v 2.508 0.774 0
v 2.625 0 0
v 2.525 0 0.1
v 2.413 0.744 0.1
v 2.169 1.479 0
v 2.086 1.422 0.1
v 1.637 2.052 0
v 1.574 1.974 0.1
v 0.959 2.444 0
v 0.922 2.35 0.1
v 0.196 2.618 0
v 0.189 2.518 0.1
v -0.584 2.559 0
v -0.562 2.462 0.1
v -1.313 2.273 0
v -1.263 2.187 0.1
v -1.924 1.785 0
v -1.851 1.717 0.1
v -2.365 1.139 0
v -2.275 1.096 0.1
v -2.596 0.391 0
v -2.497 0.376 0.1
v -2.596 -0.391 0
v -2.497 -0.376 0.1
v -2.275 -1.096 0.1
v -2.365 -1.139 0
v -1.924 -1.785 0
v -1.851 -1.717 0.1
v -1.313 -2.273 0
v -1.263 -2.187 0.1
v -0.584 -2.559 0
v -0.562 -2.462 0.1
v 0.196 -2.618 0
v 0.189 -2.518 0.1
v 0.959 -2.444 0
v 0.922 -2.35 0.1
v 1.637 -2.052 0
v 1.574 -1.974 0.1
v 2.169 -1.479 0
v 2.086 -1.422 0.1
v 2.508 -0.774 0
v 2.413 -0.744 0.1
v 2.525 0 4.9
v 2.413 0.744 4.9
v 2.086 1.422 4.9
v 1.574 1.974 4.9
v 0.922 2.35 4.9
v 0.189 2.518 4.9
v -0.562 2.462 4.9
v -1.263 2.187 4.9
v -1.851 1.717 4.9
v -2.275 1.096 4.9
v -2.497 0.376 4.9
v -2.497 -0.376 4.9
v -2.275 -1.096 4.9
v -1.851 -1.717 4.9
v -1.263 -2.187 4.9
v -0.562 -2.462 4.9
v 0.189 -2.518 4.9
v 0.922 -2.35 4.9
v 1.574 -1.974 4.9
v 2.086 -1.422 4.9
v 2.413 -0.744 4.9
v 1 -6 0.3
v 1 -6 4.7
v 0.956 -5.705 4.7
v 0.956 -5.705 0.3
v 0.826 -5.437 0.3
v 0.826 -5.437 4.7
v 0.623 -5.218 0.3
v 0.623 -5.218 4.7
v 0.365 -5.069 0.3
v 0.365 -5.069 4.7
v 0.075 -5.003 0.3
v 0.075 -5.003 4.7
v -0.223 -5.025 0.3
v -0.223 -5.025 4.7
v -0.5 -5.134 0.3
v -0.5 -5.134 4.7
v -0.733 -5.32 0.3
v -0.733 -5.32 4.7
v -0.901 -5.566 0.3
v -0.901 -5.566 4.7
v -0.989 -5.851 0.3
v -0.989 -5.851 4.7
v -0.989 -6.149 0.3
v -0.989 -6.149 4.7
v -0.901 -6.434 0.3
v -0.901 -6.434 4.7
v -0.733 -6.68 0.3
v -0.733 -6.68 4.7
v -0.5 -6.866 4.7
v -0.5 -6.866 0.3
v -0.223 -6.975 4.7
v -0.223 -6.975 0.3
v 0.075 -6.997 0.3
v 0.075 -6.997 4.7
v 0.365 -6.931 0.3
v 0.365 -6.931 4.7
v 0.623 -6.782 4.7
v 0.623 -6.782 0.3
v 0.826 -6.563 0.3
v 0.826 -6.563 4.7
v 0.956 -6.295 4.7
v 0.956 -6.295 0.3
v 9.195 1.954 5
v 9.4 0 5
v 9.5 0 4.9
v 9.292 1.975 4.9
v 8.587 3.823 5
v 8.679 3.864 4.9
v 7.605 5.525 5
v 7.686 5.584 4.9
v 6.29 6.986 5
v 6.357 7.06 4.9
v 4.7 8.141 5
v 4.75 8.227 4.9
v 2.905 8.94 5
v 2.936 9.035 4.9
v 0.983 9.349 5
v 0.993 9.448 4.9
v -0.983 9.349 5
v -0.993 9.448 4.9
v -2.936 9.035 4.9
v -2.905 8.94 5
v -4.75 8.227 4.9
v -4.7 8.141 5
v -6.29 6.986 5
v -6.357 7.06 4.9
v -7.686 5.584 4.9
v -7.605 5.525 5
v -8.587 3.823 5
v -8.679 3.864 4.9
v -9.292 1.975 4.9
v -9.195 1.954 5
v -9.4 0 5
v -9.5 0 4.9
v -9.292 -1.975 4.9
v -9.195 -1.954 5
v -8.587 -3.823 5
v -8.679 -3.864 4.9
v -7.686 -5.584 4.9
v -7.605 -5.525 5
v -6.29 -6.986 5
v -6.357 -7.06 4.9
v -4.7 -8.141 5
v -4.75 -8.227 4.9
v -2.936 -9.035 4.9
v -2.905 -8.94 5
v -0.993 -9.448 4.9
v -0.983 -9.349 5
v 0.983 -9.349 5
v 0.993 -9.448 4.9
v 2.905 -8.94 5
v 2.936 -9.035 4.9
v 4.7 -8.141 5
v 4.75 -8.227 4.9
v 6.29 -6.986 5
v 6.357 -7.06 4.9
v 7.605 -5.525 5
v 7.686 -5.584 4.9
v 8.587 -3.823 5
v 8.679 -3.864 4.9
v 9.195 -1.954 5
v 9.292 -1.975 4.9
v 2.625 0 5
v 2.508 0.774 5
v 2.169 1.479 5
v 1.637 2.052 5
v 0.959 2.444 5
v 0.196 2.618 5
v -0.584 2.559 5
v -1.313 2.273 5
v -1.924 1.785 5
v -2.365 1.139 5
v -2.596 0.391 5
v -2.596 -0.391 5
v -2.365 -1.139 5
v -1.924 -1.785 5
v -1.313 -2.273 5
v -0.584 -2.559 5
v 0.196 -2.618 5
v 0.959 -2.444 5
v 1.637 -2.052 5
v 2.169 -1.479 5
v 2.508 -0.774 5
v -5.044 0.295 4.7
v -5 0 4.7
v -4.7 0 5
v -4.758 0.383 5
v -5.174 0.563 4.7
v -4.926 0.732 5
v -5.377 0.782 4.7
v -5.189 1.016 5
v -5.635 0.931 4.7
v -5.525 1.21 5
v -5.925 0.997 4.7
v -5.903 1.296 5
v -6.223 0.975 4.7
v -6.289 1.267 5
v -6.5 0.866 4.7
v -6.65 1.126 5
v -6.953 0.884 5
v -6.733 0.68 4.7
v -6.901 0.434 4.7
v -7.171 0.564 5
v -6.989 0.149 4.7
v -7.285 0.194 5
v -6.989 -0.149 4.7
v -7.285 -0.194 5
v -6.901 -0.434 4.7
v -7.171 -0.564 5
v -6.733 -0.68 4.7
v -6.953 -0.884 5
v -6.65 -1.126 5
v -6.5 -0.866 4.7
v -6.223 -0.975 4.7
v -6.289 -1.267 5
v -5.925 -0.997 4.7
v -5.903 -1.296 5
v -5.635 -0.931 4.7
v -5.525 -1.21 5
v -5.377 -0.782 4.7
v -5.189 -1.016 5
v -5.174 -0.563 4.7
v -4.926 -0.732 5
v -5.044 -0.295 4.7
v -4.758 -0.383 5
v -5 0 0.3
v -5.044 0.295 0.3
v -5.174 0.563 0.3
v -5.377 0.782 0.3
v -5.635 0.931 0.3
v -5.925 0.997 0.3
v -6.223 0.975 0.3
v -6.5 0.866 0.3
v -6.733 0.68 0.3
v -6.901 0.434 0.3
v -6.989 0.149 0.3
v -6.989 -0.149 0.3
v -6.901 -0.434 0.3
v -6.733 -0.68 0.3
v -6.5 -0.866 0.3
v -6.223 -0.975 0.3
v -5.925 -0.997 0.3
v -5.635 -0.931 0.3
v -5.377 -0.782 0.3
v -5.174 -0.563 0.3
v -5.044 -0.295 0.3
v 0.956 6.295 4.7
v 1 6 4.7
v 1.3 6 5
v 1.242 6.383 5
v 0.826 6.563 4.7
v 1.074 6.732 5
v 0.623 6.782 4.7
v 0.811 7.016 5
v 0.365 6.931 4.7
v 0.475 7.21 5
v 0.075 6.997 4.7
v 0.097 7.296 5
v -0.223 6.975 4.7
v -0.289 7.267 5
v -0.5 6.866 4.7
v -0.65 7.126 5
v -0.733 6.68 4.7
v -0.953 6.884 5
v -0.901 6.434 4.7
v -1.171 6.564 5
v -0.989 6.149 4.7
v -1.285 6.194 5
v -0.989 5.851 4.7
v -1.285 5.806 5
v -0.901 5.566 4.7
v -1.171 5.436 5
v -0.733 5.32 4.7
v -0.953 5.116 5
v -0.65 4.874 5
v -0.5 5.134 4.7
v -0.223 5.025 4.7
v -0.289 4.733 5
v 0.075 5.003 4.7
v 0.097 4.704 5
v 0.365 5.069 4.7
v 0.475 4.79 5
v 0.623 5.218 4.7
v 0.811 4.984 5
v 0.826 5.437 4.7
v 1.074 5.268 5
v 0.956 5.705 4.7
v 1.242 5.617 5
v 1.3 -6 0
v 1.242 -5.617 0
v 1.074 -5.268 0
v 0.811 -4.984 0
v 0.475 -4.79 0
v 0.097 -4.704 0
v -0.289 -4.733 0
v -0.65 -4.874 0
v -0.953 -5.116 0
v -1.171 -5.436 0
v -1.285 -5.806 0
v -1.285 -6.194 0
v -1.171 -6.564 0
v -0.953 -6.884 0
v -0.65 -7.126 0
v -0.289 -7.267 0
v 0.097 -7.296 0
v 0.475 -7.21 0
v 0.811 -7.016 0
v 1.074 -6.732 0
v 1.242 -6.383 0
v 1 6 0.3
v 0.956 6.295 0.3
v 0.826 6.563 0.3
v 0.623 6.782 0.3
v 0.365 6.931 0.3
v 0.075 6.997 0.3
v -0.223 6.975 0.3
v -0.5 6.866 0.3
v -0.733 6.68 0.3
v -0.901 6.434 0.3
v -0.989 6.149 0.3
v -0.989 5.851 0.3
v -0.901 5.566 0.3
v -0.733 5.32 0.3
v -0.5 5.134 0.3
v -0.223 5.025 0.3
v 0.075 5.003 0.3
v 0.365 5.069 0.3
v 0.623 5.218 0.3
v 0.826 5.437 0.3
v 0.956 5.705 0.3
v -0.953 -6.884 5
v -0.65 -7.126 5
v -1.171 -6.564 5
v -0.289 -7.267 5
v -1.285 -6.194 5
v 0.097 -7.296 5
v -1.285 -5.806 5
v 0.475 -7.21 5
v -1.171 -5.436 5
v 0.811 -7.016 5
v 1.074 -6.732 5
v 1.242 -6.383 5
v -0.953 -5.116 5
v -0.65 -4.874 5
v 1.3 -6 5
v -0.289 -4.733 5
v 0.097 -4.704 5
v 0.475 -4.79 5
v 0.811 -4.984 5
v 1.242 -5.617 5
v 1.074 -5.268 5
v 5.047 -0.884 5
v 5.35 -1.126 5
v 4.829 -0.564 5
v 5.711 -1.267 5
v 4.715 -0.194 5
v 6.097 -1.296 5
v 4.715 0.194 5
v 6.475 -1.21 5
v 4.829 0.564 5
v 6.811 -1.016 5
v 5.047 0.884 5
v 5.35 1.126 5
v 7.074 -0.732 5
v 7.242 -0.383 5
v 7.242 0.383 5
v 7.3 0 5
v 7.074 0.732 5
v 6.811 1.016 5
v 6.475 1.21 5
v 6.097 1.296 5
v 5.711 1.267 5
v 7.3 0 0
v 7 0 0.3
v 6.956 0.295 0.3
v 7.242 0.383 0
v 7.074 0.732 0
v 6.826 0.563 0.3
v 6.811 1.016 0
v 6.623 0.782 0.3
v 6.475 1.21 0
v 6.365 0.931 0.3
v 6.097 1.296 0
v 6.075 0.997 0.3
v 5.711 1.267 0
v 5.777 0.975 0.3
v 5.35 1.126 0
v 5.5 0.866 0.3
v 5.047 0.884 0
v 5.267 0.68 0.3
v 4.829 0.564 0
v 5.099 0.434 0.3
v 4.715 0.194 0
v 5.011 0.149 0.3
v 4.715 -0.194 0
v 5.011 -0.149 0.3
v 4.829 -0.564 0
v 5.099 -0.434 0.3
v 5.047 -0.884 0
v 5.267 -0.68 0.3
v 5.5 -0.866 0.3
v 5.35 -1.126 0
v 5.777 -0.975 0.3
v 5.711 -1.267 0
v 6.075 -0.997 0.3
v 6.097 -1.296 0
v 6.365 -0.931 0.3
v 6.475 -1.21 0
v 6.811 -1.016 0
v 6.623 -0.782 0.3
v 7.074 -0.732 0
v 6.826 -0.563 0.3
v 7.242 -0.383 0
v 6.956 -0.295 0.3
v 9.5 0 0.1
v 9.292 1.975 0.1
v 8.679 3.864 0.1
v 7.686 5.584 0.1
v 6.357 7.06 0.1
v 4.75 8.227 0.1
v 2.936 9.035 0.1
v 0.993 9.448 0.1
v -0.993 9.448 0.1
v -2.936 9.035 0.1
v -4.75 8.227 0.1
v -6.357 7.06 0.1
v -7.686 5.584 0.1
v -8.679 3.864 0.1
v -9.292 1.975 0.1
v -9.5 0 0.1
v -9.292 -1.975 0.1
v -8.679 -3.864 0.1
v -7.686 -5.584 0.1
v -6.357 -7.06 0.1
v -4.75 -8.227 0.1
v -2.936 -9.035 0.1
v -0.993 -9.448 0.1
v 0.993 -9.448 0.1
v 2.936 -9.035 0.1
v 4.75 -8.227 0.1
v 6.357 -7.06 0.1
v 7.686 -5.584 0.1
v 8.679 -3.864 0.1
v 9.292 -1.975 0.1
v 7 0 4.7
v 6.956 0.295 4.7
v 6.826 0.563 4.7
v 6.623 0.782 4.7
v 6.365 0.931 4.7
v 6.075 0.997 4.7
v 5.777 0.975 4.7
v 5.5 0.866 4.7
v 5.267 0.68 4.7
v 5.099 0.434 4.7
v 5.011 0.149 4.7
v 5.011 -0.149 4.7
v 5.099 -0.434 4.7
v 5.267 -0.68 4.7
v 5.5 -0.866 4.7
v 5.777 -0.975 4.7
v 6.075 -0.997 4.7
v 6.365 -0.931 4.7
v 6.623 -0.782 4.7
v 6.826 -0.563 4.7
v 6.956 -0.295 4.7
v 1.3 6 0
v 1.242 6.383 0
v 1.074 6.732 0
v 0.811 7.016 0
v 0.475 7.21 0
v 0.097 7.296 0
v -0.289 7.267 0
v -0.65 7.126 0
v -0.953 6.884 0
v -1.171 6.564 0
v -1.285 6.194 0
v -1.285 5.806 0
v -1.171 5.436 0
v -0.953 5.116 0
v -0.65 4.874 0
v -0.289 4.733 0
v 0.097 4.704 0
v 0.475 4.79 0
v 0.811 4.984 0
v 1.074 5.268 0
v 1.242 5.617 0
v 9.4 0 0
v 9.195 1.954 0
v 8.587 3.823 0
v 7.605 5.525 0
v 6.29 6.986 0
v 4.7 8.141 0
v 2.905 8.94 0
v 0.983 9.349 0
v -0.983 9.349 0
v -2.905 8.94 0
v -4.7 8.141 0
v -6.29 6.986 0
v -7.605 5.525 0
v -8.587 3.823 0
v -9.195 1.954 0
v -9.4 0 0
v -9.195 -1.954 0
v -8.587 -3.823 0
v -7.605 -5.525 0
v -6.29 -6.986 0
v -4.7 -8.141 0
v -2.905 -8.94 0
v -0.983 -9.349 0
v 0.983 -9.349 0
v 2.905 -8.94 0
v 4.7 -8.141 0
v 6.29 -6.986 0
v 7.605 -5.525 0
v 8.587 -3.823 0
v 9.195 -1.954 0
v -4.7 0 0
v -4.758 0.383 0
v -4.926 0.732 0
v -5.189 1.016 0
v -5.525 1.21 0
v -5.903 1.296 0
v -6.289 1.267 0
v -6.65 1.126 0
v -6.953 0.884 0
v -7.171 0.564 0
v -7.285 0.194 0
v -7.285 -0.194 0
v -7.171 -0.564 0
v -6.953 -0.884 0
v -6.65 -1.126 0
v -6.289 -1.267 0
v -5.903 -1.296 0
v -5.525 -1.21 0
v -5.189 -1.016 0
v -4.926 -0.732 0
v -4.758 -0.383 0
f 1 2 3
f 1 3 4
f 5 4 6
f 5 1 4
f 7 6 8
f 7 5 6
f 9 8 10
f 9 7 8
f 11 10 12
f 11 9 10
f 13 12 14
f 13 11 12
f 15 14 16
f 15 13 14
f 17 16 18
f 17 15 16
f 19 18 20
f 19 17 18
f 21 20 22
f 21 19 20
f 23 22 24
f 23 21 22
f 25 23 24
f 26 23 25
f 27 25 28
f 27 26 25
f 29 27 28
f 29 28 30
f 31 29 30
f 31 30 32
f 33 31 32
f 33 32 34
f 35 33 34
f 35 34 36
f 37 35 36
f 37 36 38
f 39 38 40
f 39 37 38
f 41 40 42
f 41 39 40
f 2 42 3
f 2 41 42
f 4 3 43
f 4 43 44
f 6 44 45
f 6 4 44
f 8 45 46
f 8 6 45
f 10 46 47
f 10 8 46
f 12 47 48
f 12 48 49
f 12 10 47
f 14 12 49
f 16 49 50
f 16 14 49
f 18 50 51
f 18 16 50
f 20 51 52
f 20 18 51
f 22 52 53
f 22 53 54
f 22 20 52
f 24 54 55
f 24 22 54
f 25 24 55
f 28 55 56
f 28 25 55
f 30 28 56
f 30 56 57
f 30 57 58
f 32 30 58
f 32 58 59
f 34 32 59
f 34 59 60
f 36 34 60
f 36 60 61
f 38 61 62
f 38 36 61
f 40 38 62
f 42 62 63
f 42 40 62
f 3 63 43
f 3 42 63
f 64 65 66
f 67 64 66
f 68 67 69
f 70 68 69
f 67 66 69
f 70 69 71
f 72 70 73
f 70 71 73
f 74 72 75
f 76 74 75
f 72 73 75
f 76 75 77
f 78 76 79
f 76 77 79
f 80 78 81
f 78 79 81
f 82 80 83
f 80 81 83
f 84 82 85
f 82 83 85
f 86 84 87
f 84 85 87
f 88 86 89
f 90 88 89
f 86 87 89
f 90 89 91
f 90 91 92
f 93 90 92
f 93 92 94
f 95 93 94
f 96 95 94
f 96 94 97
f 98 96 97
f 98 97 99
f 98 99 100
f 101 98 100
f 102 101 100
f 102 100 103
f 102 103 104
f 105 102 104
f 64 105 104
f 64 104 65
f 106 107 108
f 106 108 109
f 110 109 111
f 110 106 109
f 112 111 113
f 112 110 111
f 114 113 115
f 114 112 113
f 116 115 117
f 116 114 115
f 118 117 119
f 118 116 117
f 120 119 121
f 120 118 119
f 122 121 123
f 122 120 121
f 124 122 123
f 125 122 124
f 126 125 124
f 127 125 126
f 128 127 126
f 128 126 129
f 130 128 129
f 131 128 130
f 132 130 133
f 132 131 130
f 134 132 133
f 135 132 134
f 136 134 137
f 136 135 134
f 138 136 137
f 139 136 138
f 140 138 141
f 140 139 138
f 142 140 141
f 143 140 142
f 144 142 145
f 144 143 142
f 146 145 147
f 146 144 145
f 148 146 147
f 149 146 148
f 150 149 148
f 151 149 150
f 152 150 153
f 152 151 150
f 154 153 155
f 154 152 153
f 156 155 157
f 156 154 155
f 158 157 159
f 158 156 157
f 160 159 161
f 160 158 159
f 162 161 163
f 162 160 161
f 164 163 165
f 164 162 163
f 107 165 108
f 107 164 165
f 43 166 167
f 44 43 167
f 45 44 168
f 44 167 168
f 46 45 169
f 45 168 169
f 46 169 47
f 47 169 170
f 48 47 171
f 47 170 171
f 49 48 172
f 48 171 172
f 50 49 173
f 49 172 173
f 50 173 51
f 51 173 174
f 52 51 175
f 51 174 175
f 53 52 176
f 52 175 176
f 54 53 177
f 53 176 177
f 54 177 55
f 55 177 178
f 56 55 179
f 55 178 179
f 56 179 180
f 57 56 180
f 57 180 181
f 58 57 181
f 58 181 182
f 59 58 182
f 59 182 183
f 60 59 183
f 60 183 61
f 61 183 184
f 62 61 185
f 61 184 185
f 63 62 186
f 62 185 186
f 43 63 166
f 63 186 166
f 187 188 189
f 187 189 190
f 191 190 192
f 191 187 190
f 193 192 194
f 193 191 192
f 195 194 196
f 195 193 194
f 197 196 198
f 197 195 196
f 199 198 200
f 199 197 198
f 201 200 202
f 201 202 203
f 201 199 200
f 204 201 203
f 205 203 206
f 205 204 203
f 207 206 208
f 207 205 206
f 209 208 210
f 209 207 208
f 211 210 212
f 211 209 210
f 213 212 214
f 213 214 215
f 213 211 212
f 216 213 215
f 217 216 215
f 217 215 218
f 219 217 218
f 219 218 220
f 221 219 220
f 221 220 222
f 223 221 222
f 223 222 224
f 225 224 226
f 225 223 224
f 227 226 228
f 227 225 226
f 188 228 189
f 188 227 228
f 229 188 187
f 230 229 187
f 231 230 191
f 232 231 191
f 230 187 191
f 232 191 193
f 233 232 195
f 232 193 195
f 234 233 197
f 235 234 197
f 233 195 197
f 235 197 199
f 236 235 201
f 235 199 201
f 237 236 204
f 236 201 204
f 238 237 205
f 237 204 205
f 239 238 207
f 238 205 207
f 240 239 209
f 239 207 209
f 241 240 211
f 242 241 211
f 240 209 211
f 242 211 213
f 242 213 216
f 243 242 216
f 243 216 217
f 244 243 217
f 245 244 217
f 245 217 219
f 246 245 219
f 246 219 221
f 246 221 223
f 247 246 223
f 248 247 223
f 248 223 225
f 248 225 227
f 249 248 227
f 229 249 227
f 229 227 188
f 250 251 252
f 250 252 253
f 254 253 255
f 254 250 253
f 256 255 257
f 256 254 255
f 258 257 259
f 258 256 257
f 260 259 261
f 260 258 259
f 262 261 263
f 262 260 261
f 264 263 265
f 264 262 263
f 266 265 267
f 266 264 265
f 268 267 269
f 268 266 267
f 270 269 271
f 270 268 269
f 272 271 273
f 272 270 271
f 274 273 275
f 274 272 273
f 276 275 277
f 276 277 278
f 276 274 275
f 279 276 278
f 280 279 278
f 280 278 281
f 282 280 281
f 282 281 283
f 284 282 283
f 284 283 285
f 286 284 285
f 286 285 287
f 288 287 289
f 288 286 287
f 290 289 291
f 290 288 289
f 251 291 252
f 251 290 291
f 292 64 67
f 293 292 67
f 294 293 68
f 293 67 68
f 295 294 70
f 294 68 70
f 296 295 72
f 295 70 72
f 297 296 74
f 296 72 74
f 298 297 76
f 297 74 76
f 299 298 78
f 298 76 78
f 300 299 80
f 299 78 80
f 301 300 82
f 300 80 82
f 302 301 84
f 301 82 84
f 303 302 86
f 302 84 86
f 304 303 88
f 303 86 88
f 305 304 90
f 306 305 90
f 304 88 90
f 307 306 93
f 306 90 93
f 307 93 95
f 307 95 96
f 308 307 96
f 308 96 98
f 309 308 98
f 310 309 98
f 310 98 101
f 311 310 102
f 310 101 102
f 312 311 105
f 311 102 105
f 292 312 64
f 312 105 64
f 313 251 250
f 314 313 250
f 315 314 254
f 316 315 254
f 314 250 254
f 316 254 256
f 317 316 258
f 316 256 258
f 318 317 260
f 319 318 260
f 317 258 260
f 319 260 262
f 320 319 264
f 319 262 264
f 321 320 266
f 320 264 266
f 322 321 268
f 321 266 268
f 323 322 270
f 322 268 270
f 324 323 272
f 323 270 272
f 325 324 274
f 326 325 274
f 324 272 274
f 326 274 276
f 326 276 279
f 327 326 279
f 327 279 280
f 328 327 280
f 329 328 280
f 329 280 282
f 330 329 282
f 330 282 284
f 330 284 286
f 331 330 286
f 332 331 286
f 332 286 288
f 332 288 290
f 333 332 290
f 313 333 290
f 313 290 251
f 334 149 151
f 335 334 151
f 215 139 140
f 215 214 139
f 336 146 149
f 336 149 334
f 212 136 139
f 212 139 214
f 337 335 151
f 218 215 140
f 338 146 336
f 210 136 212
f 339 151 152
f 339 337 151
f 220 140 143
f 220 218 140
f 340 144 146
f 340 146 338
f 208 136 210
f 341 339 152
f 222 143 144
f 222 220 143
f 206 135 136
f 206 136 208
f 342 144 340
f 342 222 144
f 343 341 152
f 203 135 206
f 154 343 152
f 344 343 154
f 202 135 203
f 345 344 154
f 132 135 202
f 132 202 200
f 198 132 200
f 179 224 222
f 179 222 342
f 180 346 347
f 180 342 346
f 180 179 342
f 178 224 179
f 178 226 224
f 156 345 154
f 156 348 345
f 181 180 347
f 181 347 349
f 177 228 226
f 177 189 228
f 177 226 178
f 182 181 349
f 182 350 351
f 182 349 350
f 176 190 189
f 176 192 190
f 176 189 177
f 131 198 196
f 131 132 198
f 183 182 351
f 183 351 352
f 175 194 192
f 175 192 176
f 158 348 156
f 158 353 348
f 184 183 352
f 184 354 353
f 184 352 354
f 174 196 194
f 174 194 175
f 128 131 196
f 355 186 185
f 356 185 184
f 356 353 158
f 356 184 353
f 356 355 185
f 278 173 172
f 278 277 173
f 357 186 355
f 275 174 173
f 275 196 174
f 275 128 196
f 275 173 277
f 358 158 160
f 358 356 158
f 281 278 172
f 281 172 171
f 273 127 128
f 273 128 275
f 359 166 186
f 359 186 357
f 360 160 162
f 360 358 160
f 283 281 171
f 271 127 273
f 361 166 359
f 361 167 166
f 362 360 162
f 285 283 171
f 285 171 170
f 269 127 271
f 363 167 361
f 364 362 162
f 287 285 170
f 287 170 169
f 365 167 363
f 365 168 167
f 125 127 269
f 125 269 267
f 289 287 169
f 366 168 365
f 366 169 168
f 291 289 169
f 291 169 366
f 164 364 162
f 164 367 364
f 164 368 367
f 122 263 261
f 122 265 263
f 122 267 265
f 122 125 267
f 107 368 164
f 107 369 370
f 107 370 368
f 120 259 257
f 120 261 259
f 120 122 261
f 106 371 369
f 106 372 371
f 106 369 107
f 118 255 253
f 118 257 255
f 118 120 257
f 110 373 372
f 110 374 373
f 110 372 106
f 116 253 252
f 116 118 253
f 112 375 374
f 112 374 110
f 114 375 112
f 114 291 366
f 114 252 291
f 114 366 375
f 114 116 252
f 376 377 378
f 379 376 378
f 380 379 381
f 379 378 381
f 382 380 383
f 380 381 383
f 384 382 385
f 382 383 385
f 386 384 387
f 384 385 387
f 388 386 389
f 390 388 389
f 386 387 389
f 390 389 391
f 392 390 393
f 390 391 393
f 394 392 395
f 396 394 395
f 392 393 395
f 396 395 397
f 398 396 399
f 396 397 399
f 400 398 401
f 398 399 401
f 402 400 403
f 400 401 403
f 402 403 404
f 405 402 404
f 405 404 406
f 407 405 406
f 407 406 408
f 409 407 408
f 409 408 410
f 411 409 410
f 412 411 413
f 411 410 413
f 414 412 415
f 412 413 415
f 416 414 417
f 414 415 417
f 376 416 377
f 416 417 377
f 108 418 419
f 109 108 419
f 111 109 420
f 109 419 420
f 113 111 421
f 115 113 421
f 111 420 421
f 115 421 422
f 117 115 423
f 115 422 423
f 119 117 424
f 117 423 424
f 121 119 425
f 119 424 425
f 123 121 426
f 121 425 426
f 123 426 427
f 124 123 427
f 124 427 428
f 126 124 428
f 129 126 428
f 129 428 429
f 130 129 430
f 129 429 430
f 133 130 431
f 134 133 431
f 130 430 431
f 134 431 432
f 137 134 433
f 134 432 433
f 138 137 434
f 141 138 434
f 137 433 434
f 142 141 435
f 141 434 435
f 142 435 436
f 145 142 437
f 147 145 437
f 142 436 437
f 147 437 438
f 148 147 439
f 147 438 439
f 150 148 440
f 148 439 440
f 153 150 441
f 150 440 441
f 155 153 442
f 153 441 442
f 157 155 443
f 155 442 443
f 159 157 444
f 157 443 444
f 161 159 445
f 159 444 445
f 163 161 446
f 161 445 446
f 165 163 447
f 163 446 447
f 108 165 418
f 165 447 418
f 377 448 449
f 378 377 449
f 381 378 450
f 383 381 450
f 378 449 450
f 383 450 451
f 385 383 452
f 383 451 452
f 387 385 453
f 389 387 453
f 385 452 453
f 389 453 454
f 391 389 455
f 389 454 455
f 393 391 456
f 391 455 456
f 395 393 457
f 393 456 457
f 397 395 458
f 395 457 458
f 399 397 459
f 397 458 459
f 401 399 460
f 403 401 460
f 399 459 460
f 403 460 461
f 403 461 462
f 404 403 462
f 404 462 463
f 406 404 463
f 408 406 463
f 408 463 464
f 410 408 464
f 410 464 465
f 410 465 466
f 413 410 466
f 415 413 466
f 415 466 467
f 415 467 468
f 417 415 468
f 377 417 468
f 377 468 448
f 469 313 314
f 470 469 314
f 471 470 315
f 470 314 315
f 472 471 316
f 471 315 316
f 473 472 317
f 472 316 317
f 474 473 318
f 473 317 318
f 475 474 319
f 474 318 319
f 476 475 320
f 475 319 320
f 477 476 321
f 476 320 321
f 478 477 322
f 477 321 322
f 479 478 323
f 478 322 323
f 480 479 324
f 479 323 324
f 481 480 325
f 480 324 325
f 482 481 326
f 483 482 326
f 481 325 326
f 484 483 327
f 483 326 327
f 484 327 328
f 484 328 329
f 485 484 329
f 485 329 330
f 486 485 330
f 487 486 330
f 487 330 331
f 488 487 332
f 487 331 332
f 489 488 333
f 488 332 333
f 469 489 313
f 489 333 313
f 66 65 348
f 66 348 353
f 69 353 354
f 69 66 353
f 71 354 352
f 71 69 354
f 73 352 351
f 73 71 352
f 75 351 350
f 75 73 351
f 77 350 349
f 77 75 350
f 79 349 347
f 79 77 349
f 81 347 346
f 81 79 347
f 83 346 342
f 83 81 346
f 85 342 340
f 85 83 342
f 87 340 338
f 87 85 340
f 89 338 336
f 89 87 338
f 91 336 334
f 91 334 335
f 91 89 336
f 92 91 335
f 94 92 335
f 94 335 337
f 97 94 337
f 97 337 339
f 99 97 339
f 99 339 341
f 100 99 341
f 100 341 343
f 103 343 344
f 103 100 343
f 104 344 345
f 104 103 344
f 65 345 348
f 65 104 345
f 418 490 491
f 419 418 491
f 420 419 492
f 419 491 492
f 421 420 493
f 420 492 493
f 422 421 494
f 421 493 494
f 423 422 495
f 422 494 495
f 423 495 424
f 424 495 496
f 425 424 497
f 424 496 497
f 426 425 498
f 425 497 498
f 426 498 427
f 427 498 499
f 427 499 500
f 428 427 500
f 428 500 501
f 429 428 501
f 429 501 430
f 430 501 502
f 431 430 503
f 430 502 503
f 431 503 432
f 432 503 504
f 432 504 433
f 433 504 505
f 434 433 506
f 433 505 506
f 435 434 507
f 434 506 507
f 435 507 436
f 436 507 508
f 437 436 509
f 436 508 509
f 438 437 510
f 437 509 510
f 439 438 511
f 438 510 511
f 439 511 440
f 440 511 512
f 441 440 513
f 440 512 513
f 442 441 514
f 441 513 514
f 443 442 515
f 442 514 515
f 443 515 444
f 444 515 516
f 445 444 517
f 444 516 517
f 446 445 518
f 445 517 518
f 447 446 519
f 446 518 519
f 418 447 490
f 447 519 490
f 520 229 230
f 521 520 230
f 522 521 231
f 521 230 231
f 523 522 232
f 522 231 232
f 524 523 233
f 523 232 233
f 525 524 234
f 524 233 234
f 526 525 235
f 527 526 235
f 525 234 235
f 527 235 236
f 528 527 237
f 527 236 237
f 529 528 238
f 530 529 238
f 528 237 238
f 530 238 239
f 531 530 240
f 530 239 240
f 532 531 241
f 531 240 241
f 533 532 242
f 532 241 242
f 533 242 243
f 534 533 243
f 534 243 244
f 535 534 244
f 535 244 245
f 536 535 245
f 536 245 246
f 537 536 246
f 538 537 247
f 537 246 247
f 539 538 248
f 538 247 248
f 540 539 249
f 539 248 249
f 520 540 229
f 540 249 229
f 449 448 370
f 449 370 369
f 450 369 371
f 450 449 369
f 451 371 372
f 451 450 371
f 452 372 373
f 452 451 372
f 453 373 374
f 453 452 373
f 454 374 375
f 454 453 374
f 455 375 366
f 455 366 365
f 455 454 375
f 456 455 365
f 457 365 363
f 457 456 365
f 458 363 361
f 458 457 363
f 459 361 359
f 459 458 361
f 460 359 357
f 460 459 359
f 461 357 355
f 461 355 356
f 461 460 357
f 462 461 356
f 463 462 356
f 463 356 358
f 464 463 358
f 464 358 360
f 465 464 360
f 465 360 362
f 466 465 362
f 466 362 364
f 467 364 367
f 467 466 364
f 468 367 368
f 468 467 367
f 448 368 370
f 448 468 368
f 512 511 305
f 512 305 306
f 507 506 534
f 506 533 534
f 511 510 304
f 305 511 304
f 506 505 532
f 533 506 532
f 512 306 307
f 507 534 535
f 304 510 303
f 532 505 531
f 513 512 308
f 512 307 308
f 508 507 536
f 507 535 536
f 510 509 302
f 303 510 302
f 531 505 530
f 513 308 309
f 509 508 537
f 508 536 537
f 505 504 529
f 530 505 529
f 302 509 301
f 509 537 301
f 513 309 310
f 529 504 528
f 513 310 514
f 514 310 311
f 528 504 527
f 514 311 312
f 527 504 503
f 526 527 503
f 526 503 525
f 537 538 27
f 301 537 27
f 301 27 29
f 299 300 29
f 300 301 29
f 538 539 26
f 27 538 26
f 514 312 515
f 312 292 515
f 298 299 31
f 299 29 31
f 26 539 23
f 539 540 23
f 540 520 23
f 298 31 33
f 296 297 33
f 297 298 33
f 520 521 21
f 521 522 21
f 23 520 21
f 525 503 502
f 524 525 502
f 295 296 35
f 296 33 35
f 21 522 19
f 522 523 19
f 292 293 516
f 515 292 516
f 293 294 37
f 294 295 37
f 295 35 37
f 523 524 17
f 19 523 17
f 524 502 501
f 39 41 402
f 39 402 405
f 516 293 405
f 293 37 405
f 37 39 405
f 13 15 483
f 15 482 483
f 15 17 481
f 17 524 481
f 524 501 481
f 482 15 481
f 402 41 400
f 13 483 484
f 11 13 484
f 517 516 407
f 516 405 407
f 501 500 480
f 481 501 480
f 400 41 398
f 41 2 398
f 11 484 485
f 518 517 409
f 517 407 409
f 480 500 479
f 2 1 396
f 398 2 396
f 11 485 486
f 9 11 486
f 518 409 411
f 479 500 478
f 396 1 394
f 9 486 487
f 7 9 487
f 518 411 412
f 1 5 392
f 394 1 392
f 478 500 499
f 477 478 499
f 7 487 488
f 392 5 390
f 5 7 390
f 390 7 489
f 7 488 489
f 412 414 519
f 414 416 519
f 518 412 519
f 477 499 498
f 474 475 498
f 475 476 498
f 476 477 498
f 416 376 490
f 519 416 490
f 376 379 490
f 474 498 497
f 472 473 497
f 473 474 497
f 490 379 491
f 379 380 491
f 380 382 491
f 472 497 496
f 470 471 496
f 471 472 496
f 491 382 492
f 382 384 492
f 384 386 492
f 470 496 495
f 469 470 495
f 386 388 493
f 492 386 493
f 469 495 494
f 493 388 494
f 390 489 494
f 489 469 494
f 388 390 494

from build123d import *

# Parameters (mm, degrees)
F0_R     = 9.5
F0_R_2   = 2.525
F1_DEPTH = 5
F2_SIZE  = 0.1
F3_R     = 1
F4_DEPTH = 5.001
F5_SIZE  = 0.3


with BuildPart() as f1:
    # F0 (on Top) → F1 (new body)
    with BuildSketch(Plane.XY):
        Circle(F0_R)
        Circle(F0_R_2, mode=Mode.SUBTRACT)
    extrude(amount=F1_DEPTH)

    # F2
    f2_edges = [f1.edges().sort_by_distance(p)[0] for p in [
        (-9.5, 0, 5),
        (-9.5, 0, 0),
        (-2.525, 0, 5),
        (-2.525, 0, 0),
    ]]
    chamfer(f2_edges, length=F2_SIZE)

    # F3 (on face) → F4 (cut, through all)
    with BuildSketch(Plane.XY.offset(5)):
        with Locations((0, 6)):
            Circle(F3_R)
        with Locations((-6, 0)):
            Circle(F3_R)
        with Locations((0, -6)):
            Circle(F3_R)
        with Locations((6, 0)):
            Circle(F3_R)
    extrude(amount=-F4_DEPTH, mode=Mode.SUBTRACT)

    # F5
    f5_edges = [f1.edges().sort_by_distance(p)[0] for p in [
        (-1, 6, 5),
        (5, 0, 5),
        (-1, -6, 5),
        (-7, 0, 5),
        (-7, 0, 0),
        (-1, 6, 0),
        (5, 0, 0),
        (-1, -6, 0),
    ]]
    chamfer(f5_edges, length=F5_SIZE)


solid = f1.part
